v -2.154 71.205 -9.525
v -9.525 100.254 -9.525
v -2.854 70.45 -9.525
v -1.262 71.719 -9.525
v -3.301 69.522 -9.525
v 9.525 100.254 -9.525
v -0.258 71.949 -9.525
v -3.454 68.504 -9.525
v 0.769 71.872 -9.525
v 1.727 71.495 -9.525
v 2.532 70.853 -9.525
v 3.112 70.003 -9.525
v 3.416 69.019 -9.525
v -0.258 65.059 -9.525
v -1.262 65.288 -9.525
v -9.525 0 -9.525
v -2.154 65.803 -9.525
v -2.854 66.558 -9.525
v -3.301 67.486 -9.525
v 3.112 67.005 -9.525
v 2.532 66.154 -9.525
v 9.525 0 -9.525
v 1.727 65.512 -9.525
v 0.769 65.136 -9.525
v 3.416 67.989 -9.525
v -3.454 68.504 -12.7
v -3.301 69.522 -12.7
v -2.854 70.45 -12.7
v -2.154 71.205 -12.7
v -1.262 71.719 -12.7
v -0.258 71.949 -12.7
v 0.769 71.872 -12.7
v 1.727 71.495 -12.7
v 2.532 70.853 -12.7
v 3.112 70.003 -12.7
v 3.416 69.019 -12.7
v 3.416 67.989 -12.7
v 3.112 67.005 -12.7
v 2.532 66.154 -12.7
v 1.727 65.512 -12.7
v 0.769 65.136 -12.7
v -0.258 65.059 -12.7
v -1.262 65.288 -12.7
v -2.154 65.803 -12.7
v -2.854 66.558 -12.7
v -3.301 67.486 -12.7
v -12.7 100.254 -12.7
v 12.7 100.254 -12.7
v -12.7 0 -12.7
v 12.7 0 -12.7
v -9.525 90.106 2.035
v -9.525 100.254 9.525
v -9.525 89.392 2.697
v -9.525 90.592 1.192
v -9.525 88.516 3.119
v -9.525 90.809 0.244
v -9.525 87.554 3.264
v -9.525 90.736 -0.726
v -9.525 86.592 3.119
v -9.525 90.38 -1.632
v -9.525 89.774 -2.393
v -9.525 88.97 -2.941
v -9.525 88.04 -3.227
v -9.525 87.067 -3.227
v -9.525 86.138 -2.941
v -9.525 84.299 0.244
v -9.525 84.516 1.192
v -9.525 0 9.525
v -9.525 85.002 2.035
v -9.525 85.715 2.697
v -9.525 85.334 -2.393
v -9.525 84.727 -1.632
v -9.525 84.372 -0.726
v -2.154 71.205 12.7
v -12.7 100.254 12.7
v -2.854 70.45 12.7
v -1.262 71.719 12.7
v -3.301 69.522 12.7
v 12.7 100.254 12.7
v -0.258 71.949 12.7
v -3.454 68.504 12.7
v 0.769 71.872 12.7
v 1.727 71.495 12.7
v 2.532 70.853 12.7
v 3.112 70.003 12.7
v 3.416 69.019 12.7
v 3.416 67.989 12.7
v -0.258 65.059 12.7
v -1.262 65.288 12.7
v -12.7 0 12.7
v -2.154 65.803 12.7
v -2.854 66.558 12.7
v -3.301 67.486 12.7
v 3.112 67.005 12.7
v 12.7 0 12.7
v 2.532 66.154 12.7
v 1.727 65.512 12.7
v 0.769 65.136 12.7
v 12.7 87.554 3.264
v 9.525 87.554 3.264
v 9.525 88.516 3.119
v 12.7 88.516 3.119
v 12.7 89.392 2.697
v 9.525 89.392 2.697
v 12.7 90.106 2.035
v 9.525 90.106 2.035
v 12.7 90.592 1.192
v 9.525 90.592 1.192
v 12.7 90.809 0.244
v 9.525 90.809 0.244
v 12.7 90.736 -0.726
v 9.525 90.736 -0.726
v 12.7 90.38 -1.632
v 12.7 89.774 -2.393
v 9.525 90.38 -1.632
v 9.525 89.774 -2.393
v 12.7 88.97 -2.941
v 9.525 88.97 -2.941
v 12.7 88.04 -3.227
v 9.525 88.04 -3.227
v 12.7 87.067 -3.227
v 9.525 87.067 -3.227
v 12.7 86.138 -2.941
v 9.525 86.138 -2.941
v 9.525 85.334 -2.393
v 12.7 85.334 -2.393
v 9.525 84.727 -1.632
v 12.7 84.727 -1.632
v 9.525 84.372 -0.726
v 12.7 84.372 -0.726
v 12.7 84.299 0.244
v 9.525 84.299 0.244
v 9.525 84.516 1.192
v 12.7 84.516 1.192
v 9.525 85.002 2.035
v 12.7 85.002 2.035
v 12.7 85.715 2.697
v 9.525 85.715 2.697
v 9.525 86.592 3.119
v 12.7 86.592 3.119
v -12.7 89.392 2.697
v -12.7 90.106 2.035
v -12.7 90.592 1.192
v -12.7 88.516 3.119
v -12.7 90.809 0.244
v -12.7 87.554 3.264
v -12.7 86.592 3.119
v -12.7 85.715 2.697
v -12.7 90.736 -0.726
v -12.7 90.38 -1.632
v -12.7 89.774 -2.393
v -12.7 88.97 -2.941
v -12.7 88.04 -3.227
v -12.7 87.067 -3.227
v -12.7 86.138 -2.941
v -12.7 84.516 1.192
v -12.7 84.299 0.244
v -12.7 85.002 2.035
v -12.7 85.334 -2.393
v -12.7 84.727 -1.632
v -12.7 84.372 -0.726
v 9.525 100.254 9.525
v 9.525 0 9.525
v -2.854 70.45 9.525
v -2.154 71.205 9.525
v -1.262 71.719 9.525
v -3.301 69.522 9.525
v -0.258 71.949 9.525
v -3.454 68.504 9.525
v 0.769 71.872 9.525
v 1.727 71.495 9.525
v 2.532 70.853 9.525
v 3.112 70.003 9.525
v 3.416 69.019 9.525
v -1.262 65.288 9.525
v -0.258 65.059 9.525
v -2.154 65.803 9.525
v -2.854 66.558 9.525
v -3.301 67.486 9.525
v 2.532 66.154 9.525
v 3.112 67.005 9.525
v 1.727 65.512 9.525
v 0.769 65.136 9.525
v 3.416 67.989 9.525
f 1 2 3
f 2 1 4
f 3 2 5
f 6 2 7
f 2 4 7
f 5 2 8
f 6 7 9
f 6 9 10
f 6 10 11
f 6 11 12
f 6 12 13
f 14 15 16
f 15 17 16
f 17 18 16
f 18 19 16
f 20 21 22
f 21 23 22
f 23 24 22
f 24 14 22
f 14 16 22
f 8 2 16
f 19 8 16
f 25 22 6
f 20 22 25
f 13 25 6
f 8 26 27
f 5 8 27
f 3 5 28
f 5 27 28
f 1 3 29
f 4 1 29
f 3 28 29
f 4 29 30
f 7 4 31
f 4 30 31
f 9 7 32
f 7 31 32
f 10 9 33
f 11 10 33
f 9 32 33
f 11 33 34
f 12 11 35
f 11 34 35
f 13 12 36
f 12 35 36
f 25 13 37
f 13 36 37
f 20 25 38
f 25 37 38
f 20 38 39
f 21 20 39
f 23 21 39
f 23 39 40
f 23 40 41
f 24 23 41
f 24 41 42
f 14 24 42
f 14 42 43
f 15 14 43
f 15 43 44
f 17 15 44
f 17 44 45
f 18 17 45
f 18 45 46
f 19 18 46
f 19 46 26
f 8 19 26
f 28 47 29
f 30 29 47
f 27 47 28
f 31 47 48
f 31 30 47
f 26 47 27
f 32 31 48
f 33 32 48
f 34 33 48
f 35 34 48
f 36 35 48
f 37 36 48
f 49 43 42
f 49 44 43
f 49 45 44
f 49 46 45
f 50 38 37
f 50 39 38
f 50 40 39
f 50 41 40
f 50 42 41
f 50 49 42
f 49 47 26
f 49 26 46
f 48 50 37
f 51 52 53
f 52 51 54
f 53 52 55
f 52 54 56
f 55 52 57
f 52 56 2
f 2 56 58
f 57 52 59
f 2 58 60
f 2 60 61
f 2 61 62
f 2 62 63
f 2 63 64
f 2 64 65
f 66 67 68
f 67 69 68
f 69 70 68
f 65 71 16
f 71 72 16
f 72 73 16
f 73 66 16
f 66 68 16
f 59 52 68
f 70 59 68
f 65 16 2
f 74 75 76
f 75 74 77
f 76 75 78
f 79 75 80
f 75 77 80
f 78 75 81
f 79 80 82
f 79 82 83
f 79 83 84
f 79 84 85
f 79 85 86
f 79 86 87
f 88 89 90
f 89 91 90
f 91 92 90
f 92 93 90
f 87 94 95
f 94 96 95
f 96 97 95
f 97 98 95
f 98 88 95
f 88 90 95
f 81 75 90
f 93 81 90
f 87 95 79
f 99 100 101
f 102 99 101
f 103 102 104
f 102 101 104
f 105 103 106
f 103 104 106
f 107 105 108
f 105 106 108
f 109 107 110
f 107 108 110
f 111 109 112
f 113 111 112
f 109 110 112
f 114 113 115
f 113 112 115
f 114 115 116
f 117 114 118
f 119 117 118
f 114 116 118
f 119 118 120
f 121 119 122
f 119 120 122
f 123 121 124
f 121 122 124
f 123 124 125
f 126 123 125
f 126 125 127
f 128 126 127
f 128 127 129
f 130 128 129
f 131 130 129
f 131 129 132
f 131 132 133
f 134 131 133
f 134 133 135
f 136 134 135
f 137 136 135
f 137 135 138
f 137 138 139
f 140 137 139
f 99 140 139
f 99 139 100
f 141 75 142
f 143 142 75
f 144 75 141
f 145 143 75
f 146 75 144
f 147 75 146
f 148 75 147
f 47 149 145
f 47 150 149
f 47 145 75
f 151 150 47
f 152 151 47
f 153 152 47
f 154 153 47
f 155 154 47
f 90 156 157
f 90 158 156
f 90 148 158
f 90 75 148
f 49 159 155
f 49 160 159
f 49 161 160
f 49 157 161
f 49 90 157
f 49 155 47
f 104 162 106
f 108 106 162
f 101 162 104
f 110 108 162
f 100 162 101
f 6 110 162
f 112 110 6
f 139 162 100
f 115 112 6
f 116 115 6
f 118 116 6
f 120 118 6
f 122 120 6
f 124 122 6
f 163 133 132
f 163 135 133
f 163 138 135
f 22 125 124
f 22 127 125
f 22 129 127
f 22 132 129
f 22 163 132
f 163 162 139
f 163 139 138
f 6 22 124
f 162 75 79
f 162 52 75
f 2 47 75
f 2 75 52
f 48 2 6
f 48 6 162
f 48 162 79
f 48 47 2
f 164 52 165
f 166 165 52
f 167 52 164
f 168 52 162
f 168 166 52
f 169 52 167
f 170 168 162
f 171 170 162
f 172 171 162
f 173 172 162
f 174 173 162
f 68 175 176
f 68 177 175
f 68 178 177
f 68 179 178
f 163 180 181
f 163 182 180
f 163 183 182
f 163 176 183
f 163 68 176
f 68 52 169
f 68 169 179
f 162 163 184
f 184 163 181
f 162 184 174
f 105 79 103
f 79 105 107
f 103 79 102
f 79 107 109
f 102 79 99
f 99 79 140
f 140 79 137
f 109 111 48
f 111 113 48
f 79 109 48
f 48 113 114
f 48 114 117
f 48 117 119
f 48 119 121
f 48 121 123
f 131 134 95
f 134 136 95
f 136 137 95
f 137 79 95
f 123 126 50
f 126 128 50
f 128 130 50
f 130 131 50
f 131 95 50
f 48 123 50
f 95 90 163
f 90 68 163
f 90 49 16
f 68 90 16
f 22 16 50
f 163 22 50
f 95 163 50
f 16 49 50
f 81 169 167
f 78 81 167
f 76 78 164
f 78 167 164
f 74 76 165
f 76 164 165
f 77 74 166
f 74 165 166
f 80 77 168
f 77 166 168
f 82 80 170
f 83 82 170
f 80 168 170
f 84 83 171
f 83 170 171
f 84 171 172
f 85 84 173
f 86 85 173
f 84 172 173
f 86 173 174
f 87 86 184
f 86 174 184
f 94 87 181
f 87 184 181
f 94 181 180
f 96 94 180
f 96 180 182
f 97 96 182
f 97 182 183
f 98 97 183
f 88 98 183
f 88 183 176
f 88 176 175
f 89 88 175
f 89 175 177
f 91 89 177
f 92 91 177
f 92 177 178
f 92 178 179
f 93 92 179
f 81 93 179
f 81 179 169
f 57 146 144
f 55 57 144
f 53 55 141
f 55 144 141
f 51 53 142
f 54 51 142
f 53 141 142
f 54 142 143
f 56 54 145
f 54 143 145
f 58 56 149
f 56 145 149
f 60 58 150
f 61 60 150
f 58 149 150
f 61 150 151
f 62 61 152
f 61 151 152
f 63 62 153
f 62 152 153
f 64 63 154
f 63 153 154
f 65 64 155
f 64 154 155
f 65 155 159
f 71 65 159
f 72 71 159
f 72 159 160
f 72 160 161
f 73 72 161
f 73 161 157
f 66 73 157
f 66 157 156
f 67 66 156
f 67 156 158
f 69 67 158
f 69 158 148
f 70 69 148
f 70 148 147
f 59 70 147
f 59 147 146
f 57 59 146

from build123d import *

# Parameters (mm, degrees)
SKETCH1_W                = 25.4
SKETCH1_H                = 25.4
SKETCH1_W_2              = 19.05
SKETCH1_H_2              = 19.05
BOSS_EXTRUDE1_DEPTH      = 100.2538
F_0_257_DIAMETER_HOLE1_D = 6.5278
I_0_272_DIAMETER_HOLE1_D = 6.9088


with BuildPart() as part:
    # Sketch1 → Boss-Extrude1 (new body)
    with BuildSketch(Plane(origin=(0, 0, 0), x_dir=(1, 0, 0), z_dir=(0, 1, 0))):
        Rectangle(SKETCH1_W, SKETCH1_H)
        Rectangle(SKETCH1_W_2, SKETCH1_H_2, mode=Mode.SUBTRACT)
    extrude(amount=BOSS_EXTRUDE1_DEPTH)

    # F (0.257) Diameter Hole1 (through all)
    with Locations(Plane(origin=(12.7, 0, 0), x_dir=(0, 0, -1), z_dir=(1, 0, 0))):
        with Locations((0, 87.5538)):
            Hole(F_0_257_DIAMETER_HOLE1_D / 2)

    # I (0.272) Diameter Hole1 (through all)
    with Locations(Plane.XY.offset(12.7)):
        with Locations((0, 68.5038)):
            Hole(I_0_272_DIAMETER_HOLE1_D / 2)


solid = part.part
